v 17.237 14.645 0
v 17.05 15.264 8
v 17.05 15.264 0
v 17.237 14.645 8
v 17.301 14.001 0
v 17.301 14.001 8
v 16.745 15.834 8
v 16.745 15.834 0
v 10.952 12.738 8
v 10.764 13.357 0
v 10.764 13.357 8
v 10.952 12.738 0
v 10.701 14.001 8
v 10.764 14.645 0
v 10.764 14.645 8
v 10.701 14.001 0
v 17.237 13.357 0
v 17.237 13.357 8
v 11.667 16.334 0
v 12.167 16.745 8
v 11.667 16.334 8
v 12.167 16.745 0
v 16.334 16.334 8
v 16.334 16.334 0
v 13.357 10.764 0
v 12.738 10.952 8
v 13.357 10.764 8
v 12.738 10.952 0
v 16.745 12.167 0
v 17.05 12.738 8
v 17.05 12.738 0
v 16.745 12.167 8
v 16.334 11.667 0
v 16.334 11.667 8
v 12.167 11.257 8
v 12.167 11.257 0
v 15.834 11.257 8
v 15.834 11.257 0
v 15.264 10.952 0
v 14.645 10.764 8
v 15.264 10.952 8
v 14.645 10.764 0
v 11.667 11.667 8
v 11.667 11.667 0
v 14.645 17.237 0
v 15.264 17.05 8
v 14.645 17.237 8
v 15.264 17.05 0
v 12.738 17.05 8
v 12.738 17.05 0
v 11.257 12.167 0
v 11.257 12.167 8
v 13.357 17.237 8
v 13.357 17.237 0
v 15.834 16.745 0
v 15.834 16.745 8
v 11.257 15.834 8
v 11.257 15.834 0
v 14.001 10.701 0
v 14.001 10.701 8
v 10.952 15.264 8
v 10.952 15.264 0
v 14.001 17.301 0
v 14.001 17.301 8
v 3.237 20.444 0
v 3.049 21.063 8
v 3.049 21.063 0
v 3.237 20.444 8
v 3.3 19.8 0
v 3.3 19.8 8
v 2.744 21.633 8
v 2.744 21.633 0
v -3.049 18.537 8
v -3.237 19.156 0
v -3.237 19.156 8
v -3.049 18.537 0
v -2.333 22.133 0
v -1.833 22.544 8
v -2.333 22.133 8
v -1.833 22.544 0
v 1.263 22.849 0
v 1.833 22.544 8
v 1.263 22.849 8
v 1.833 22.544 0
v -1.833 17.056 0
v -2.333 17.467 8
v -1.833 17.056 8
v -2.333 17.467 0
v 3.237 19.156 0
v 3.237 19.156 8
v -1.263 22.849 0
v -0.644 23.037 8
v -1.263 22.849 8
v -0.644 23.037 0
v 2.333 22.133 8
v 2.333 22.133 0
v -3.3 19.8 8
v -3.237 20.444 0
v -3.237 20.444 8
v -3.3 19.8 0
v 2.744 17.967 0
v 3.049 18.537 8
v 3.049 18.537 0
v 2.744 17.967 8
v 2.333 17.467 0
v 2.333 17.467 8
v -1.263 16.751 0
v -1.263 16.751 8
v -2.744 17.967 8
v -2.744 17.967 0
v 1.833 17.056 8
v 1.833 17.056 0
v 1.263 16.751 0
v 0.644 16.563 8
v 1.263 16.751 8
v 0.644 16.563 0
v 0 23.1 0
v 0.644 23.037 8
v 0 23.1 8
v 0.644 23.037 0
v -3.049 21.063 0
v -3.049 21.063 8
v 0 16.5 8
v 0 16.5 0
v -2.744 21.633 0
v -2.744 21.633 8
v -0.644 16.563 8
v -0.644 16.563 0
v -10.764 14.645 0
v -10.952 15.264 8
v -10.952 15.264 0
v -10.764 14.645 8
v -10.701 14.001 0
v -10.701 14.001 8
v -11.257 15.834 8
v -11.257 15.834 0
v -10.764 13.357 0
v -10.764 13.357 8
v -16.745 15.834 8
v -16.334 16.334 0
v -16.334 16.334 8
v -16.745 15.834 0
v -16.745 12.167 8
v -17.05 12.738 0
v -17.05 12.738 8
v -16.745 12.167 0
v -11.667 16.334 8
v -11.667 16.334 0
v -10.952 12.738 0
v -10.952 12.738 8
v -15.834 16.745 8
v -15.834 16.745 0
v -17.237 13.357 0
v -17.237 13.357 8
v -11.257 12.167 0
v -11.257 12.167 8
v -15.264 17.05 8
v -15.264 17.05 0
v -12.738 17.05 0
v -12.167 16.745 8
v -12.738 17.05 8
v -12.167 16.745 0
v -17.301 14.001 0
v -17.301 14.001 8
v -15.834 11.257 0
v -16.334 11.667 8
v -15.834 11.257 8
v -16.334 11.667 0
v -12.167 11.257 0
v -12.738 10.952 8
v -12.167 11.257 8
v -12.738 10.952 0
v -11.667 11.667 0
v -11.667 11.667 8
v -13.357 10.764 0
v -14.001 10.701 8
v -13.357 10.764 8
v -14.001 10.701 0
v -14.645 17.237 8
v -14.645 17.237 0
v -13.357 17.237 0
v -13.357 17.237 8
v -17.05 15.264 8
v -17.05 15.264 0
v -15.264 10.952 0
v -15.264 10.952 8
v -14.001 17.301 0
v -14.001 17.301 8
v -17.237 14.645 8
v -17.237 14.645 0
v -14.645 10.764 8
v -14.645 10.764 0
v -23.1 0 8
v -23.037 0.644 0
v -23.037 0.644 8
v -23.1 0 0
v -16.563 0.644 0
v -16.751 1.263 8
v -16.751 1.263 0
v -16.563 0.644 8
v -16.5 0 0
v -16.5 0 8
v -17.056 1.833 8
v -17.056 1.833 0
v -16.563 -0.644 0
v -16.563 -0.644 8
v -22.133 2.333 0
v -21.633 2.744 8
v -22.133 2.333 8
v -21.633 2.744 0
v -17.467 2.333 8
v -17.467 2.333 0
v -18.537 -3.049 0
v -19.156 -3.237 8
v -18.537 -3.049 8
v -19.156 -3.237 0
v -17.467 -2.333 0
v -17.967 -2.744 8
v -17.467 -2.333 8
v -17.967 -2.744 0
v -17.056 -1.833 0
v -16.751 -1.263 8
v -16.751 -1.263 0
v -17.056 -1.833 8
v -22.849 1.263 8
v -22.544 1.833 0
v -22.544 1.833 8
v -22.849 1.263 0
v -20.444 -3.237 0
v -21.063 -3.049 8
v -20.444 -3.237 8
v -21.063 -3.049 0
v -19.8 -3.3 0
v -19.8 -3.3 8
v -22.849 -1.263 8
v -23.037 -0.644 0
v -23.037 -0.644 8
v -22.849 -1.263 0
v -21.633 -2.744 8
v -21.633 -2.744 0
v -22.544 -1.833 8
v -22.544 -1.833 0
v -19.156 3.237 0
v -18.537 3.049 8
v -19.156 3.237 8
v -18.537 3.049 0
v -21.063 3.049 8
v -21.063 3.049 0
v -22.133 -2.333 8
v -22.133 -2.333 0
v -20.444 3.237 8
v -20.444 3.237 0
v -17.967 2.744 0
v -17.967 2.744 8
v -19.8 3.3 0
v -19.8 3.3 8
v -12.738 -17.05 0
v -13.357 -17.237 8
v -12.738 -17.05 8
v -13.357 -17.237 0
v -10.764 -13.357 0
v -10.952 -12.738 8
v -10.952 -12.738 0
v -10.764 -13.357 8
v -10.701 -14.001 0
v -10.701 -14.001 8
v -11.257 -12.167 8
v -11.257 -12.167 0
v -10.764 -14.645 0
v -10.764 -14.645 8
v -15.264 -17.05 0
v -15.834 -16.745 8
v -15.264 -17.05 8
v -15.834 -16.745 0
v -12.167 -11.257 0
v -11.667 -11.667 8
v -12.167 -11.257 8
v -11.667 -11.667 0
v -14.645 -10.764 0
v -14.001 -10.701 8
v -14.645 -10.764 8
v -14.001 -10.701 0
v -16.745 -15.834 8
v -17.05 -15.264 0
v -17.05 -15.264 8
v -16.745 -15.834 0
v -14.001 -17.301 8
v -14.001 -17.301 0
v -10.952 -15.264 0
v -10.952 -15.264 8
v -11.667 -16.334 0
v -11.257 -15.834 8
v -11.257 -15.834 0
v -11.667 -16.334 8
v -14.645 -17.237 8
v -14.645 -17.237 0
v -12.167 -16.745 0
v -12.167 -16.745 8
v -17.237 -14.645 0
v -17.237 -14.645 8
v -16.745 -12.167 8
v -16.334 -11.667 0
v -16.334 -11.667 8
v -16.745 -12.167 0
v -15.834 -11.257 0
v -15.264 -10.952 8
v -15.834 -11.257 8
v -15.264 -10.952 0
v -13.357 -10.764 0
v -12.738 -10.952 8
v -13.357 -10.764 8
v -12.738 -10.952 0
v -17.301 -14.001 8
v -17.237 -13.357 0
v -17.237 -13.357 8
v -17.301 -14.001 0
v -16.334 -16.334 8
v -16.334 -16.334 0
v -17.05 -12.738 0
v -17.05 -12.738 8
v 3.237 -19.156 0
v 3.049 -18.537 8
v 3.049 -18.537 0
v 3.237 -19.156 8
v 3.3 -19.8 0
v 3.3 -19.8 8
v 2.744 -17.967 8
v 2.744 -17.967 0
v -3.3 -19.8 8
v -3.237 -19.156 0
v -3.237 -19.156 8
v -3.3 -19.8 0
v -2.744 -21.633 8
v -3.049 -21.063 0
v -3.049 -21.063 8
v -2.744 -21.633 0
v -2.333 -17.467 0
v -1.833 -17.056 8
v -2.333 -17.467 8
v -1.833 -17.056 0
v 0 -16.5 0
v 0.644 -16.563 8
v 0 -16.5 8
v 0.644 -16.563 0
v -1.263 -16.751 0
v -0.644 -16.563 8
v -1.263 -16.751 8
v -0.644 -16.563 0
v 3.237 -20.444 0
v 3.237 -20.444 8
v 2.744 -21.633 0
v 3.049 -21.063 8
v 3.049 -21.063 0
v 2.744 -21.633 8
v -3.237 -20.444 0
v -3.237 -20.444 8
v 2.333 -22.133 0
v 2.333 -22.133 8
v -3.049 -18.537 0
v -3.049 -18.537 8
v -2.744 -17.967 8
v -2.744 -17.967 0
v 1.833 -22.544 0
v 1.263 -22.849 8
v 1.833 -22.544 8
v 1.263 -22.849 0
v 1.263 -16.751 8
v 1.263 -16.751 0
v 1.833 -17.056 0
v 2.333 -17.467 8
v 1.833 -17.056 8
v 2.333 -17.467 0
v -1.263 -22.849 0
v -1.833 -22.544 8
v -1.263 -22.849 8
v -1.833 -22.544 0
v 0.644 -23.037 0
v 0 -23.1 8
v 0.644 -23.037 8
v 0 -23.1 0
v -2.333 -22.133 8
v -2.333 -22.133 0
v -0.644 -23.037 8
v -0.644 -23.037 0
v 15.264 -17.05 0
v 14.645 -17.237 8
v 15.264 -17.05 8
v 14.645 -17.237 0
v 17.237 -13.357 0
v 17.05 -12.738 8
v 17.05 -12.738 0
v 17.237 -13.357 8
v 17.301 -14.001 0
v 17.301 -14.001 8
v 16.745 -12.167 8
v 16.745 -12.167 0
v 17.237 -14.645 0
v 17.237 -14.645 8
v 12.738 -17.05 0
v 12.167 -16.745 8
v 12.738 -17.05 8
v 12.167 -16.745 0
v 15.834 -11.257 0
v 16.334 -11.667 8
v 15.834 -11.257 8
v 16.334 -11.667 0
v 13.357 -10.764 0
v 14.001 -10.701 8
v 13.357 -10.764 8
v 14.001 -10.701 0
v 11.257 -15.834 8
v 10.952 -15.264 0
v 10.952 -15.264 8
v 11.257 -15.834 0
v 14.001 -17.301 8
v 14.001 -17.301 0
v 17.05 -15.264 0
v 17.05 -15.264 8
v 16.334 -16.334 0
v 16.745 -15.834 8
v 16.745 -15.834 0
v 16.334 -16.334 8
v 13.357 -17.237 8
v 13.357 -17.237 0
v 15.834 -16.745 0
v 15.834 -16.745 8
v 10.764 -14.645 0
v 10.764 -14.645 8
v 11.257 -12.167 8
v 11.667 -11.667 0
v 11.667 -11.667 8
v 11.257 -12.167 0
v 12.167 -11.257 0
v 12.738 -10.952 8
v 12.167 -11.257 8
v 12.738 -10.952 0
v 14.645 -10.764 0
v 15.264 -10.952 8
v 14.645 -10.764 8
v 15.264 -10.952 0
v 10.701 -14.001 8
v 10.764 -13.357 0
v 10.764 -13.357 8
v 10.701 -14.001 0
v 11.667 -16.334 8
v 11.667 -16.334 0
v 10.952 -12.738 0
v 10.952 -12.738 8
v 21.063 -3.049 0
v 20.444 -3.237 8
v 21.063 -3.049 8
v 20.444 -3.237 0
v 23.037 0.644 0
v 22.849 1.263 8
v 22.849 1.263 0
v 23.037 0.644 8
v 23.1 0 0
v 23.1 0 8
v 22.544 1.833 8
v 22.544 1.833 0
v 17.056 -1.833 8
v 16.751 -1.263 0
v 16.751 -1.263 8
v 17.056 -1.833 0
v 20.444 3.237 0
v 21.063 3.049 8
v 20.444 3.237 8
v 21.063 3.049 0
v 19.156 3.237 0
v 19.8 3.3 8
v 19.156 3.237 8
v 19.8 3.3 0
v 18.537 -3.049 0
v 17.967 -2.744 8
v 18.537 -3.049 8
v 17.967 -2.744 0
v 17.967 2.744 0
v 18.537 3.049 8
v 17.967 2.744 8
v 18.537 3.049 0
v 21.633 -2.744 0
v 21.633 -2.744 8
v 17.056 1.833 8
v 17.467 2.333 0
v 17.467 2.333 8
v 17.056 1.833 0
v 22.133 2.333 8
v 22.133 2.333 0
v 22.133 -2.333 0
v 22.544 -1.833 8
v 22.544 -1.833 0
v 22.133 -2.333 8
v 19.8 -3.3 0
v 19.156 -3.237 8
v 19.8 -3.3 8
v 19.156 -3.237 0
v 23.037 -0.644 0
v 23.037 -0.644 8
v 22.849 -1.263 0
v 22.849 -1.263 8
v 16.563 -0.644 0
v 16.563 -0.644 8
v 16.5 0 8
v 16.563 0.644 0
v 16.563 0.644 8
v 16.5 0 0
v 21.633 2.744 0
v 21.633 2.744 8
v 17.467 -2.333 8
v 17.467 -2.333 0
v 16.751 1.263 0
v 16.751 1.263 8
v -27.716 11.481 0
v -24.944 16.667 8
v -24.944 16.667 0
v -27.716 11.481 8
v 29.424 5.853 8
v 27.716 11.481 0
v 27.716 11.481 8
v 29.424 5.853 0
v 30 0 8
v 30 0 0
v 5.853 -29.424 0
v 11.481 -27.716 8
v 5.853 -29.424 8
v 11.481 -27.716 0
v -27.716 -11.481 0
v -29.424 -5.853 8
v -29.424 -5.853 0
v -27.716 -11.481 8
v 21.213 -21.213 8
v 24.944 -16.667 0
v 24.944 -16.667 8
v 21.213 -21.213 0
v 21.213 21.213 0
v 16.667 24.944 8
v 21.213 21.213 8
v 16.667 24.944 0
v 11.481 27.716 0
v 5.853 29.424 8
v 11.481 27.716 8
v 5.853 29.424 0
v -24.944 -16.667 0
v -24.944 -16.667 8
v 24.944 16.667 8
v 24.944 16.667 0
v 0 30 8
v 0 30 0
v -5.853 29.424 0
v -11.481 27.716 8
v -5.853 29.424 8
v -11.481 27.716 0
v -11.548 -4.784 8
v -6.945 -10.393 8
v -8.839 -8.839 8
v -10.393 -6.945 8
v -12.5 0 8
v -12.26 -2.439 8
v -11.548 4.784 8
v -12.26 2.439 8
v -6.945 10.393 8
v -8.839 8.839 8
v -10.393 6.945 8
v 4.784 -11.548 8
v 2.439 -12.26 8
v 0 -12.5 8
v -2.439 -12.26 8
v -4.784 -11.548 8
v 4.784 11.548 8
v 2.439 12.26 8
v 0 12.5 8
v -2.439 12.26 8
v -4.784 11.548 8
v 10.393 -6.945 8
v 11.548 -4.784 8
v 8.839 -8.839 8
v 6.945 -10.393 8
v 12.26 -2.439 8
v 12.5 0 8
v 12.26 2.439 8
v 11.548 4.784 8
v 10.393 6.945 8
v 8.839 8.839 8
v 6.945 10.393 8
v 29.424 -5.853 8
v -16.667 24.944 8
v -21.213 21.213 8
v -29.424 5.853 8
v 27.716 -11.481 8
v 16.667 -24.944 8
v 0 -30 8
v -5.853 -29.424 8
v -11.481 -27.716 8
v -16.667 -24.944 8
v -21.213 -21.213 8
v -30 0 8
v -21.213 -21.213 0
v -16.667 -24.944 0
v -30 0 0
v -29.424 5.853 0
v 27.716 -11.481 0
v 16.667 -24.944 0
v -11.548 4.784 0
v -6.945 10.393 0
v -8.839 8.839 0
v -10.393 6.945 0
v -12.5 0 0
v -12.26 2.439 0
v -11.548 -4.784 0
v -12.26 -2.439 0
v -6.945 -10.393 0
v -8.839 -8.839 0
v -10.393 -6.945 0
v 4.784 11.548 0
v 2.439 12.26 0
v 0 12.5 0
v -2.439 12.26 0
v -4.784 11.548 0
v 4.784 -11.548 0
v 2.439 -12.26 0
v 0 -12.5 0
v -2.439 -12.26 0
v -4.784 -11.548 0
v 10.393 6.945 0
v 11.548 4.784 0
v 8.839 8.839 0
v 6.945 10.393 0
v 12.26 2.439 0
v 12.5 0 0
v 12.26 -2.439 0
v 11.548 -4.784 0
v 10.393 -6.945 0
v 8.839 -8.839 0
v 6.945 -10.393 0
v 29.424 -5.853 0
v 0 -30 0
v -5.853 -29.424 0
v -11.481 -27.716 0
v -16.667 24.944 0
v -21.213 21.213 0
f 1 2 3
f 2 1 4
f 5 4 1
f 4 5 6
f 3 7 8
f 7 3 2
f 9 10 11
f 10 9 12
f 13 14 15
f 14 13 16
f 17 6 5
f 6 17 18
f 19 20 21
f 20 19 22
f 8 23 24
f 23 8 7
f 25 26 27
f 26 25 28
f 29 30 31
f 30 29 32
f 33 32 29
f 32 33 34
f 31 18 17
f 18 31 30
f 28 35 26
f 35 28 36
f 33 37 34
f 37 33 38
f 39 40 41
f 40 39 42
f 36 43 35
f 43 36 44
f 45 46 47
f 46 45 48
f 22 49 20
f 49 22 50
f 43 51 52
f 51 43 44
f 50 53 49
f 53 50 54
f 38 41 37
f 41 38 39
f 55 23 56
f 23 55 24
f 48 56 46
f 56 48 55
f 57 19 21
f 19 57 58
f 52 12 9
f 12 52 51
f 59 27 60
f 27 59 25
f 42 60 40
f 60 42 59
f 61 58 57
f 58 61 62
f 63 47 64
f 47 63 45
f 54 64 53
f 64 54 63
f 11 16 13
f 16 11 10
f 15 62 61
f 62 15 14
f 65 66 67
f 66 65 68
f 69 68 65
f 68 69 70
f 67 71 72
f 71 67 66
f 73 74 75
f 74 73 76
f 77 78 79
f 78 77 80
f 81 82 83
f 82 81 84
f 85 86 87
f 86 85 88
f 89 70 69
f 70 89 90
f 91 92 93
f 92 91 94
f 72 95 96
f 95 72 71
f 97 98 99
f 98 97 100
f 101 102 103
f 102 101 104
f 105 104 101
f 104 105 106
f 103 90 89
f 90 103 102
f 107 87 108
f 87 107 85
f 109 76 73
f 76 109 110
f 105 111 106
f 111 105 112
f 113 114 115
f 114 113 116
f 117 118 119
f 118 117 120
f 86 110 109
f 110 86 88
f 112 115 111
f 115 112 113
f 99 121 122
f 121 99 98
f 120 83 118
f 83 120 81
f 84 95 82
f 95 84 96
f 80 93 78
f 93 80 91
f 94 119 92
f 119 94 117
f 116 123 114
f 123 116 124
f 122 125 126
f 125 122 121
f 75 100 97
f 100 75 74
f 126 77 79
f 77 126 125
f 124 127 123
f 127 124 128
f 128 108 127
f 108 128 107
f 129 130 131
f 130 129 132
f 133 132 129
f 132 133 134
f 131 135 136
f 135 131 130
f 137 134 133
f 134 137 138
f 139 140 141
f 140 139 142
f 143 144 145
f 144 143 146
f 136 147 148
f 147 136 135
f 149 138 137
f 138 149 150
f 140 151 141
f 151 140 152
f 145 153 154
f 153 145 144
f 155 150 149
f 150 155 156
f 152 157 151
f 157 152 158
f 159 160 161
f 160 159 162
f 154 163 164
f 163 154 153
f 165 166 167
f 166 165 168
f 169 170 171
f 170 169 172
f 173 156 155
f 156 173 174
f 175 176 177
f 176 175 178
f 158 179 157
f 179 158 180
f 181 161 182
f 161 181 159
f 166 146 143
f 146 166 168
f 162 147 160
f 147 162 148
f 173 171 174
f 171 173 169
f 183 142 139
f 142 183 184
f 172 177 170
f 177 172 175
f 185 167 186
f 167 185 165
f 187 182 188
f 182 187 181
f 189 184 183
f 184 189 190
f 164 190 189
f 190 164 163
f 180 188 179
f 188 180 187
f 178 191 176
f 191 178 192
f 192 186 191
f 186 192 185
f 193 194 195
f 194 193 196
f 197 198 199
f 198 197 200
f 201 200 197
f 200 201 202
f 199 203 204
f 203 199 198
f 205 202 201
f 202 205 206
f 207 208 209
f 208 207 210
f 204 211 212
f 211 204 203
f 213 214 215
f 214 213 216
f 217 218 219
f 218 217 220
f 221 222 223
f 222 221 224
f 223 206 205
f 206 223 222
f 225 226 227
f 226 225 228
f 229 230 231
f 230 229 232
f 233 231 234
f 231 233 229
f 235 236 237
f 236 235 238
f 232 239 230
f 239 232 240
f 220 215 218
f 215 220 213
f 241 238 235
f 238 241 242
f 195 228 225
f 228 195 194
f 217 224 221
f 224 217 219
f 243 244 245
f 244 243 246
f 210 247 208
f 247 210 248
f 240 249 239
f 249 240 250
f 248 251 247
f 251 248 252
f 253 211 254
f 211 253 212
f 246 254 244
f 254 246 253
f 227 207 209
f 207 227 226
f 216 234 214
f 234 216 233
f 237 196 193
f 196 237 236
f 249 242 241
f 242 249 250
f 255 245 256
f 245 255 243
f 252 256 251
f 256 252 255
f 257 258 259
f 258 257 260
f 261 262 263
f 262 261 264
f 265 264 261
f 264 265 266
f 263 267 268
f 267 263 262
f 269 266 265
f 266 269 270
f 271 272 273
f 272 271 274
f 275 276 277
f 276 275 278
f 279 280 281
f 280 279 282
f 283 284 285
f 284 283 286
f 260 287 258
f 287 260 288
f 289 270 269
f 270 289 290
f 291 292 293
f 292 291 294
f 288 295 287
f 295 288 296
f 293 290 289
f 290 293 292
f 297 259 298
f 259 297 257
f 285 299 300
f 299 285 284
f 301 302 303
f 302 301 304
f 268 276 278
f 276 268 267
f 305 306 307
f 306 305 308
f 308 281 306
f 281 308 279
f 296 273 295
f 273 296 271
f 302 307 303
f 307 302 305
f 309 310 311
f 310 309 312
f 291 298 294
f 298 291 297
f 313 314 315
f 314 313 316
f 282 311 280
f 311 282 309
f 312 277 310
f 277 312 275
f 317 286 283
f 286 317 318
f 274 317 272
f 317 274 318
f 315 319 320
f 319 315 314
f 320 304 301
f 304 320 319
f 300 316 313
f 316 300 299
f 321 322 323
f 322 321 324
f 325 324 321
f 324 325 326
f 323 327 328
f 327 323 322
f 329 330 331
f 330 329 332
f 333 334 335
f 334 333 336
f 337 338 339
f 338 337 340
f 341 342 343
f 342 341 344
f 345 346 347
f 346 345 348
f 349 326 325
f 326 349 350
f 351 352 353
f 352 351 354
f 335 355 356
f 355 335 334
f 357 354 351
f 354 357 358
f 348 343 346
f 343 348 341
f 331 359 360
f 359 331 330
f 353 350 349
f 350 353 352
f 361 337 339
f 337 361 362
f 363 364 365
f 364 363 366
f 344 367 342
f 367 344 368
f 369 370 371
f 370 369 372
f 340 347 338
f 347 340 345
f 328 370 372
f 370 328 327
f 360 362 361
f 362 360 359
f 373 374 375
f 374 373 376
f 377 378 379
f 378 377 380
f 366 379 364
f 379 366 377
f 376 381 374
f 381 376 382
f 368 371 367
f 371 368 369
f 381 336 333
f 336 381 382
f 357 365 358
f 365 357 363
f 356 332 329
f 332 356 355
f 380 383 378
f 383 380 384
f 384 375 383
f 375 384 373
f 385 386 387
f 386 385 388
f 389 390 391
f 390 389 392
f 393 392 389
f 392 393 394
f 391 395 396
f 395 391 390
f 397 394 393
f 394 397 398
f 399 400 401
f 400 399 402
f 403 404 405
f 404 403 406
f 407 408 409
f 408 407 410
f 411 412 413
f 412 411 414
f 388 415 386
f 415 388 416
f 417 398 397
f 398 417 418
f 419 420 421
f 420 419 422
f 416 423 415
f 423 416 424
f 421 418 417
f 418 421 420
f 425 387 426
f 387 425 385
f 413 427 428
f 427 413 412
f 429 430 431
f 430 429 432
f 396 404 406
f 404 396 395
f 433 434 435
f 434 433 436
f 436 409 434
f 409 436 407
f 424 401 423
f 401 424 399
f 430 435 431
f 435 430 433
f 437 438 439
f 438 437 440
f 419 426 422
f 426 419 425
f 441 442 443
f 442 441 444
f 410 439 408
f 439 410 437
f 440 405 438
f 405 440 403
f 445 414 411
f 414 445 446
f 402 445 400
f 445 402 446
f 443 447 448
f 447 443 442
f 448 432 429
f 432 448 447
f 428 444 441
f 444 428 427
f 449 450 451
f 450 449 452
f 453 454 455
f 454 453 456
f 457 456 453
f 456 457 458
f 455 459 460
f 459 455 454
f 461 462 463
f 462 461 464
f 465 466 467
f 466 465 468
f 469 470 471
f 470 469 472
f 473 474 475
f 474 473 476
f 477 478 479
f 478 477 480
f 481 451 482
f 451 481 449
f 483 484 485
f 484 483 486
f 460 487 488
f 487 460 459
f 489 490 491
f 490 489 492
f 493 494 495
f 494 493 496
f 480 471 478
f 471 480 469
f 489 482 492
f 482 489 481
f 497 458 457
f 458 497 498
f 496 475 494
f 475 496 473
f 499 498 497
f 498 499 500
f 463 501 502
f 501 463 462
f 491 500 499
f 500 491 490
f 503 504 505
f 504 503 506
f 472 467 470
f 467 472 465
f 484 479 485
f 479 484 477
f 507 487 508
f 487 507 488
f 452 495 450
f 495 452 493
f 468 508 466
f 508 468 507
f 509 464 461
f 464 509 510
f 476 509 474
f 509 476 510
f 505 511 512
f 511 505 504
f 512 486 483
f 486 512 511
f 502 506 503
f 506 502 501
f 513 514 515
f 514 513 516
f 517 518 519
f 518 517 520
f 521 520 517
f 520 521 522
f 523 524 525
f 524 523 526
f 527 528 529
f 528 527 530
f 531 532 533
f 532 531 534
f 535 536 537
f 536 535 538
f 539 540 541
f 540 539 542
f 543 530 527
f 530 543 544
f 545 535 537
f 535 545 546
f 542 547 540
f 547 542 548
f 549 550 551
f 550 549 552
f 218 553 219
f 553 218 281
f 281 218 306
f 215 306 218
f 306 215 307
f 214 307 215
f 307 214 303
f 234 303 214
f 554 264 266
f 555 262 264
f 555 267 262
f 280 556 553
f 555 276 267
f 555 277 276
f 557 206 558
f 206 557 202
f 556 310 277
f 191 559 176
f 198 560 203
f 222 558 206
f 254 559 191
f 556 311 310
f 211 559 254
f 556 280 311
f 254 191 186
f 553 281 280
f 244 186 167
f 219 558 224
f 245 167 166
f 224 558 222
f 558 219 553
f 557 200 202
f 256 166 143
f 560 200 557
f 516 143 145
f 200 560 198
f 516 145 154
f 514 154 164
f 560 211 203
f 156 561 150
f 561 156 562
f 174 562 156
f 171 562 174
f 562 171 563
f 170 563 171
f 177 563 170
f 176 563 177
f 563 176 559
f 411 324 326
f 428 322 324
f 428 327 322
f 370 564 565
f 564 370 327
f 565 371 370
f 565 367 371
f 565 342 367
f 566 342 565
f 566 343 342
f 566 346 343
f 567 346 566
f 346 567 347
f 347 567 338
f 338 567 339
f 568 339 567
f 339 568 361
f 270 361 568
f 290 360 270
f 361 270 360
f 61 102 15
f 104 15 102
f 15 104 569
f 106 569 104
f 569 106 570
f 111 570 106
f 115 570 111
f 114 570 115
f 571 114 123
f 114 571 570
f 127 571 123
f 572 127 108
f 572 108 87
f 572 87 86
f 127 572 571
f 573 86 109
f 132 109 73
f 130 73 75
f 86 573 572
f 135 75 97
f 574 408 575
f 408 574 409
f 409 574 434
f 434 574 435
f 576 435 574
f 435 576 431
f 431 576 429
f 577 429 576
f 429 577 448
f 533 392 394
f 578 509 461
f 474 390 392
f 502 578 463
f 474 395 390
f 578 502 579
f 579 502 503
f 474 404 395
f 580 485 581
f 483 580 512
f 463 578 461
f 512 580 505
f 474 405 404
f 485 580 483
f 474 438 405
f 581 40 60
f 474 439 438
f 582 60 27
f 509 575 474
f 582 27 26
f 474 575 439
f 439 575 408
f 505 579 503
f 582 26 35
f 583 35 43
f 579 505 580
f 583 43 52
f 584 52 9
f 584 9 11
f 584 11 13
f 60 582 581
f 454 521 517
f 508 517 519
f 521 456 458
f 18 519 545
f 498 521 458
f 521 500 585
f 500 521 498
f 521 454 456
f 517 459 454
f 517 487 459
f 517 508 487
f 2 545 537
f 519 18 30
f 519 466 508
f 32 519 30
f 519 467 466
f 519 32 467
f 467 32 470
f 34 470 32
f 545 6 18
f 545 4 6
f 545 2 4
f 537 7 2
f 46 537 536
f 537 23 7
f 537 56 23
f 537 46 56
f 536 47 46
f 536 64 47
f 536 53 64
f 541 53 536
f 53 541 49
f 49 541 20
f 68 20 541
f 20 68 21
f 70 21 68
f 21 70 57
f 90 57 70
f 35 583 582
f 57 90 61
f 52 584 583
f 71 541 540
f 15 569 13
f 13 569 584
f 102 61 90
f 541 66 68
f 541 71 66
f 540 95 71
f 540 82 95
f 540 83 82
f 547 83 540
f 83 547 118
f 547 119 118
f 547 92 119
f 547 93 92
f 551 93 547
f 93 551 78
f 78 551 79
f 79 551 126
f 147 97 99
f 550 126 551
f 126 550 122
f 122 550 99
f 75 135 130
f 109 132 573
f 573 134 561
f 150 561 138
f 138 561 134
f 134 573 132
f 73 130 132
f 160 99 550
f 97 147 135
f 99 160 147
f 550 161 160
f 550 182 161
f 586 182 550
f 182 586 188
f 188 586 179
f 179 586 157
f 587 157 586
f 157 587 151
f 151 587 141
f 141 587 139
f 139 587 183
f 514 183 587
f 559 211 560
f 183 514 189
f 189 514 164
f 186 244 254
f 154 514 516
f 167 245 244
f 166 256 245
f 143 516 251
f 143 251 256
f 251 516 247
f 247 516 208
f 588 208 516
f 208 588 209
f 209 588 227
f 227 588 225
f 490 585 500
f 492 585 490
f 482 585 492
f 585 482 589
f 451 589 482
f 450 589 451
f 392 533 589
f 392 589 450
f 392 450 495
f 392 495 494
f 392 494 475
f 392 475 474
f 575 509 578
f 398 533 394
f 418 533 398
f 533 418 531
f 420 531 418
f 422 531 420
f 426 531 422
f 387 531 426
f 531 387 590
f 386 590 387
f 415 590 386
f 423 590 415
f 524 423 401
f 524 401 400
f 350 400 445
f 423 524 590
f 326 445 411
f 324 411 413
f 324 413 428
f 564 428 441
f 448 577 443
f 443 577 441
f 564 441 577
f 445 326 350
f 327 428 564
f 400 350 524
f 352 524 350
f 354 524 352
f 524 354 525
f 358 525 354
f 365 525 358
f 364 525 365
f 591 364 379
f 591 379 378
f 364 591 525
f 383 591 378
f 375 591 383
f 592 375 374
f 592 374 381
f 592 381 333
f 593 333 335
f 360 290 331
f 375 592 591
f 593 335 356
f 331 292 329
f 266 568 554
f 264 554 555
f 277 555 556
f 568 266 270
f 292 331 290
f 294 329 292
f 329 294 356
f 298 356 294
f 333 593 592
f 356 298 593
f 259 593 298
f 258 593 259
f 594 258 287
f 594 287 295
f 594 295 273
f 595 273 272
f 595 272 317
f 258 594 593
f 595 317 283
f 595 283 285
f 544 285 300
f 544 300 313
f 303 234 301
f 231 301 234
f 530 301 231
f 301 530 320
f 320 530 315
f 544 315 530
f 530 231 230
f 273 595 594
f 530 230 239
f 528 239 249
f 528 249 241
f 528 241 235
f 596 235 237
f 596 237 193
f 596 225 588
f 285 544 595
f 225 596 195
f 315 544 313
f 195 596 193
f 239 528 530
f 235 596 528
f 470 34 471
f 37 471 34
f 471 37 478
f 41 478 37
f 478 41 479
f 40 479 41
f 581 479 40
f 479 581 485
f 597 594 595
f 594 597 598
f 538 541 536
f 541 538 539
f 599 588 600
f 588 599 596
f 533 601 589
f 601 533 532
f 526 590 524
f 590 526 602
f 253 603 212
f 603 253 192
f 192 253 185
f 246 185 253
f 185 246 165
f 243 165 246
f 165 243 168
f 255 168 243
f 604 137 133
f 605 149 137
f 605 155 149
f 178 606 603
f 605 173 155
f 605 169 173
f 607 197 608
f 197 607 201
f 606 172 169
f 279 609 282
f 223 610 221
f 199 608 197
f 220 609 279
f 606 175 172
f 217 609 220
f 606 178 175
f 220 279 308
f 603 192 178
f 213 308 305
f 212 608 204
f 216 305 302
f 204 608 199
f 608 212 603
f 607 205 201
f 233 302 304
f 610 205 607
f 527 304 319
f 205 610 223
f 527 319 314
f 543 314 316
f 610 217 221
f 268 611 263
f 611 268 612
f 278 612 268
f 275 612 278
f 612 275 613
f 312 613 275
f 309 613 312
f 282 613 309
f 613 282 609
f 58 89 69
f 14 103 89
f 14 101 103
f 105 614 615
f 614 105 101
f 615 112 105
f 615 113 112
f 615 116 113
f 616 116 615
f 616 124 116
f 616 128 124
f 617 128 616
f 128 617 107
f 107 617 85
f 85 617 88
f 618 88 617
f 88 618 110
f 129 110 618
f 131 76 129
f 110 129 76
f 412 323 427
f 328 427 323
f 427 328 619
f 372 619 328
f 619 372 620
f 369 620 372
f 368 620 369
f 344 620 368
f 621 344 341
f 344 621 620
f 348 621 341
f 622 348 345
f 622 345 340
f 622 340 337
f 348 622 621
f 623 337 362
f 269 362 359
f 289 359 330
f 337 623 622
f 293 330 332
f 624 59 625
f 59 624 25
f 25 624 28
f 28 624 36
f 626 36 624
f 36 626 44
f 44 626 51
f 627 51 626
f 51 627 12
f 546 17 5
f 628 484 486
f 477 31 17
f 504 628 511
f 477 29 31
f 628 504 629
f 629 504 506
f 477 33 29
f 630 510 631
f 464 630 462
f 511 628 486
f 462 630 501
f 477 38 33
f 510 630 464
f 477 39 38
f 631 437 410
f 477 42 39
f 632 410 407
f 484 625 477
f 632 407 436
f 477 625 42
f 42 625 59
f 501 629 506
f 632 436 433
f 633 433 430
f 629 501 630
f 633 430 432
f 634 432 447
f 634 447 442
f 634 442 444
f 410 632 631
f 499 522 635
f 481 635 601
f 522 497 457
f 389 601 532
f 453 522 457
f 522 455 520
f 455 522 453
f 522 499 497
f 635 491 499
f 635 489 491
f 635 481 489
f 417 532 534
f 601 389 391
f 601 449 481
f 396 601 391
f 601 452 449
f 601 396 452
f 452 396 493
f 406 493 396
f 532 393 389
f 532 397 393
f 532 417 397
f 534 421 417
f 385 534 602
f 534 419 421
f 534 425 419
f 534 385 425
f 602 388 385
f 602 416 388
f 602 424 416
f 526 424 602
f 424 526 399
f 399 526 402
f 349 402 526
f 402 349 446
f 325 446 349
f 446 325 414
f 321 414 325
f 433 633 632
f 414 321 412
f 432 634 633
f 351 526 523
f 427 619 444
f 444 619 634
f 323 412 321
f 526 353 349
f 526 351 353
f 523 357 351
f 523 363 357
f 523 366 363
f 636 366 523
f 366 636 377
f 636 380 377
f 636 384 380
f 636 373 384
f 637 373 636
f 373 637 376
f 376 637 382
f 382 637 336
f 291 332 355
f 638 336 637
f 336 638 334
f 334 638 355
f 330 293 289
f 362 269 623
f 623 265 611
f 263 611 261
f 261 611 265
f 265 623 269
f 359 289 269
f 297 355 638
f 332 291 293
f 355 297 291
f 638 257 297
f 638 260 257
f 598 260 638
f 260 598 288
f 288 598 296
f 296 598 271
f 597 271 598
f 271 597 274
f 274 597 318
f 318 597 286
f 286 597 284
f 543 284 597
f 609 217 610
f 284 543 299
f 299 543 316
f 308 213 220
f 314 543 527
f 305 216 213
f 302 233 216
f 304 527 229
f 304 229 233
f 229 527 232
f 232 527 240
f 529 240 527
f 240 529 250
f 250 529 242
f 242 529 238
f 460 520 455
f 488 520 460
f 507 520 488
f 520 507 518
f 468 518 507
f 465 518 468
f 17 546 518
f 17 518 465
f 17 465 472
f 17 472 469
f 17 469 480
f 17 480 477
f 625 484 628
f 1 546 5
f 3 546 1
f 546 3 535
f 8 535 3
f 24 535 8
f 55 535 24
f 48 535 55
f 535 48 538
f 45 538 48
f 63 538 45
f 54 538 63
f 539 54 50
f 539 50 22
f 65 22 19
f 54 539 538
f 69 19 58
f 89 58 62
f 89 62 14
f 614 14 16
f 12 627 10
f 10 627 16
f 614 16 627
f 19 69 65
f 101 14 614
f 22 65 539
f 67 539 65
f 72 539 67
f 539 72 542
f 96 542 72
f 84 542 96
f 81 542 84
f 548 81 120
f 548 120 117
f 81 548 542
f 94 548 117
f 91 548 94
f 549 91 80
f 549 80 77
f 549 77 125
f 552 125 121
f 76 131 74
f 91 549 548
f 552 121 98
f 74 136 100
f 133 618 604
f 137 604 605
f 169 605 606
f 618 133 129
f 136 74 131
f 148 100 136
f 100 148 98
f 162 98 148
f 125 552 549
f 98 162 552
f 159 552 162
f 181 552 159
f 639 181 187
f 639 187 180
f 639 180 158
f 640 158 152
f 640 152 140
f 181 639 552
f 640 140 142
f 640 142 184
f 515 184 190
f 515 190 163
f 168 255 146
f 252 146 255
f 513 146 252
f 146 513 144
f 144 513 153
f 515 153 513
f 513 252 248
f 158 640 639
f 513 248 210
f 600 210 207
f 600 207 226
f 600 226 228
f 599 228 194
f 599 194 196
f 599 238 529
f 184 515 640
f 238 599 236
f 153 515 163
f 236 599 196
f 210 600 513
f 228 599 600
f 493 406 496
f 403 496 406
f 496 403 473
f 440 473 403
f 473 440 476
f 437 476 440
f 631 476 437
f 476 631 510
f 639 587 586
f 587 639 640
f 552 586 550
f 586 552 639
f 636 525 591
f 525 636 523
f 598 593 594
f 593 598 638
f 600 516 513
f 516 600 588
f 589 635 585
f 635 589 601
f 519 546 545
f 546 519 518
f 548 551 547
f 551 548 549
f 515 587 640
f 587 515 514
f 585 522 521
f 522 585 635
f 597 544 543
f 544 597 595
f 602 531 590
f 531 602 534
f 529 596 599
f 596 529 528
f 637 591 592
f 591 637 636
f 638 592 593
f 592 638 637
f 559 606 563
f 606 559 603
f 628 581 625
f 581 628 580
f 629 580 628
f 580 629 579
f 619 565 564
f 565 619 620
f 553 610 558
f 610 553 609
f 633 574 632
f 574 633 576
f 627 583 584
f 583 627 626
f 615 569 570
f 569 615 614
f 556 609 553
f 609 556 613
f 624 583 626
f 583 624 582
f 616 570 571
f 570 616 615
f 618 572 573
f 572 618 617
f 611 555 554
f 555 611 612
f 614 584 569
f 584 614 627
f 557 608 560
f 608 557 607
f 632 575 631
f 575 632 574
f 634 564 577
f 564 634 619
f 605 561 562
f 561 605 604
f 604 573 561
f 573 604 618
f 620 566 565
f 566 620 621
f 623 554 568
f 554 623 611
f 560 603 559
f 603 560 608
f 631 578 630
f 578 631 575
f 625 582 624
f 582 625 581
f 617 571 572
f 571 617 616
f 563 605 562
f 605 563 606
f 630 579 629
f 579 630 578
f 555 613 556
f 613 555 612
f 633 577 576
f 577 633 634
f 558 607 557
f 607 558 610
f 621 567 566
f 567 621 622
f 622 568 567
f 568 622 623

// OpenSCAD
$fn = 32;

// ----------------------------------------------------------------------
// Flange Ø60 x 8
// 8 holes on a Ø39.6 bolt circle, bolted joints
// ----------------------------------------------------------------------

// --- parameters (mm) ---
flange_d = 60;   // outside diameter of the flange
thickness = 8;   // flange thickness
holes = 8;       // number of bolt holes
pcd = 39.6;      // bolt circle diameter
start_deg = 45;  // angle of the first hole, from +X
hole_d = 6.6;    // bolt hole diameter
bore_d = 25;     // central through bore
hub_d = 35;      // hub outside diameter
hub_h = 0;       // hub height above the flange face (0 = no hub)

// --- derived feature positions (mm) ---
height = thickness + hub_h;  // = 8   overall height of the part
pcd_r = pcd / 2;             // = 19.8   bolt circle radius
hole_step = 360 / holes;     // = 45   angular pitch
feature_centers = [
  [pcd_r * cos(start_deg + 0 * hole_step), pcd_r * sin(start_deg + 0 * hole_step)],
  [pcd_r * cos(start_deg + 1 * hole_step), pcd_r * sin(start_deg + 1 * hole_step)],
  [pcd_r * cos(start_deg + 2 * hole_step), pcd_r * sin(start_deg + 2 * hole_step)],
  [pcd_r * cos(start_deg + 3 * hole_step), pcd_r * sin(start_deg + 3 * hole_step)],
  [pcd_r * cos(start_deg + 4 * hole_step), pcd_r * sin(start_deg + 4 * hole_step)],
  [pcd_r * cos(start_deg + 5 * hole_step), pcd_r * sin(start_deg + 5 * hole_step)],
  [pcd_r * cos(start_deg + 6 * hole_step), pcd_r * sin(start_deg + 6 * hole_step)],
  [pcd_r * cos(start_deg + 7 * hole_step), pcd_r * sin(start_deg + 7 * hole_step)]
];   // bolt hole centres on the pitch circle

// flange disc, every hole and the bore cut straight through
difference() {
  union() {
    cylinder(d = flange_d, h = thickness);
  }
  translate([0, 0, -1]) cylinder(d = bore_d, h = height + 2);  // bore, through
  for (centre = feature_centers)
    translate([centre[0], centre[1], -1]) cylinder(d = hole_d, h = thickness + 2);
}
